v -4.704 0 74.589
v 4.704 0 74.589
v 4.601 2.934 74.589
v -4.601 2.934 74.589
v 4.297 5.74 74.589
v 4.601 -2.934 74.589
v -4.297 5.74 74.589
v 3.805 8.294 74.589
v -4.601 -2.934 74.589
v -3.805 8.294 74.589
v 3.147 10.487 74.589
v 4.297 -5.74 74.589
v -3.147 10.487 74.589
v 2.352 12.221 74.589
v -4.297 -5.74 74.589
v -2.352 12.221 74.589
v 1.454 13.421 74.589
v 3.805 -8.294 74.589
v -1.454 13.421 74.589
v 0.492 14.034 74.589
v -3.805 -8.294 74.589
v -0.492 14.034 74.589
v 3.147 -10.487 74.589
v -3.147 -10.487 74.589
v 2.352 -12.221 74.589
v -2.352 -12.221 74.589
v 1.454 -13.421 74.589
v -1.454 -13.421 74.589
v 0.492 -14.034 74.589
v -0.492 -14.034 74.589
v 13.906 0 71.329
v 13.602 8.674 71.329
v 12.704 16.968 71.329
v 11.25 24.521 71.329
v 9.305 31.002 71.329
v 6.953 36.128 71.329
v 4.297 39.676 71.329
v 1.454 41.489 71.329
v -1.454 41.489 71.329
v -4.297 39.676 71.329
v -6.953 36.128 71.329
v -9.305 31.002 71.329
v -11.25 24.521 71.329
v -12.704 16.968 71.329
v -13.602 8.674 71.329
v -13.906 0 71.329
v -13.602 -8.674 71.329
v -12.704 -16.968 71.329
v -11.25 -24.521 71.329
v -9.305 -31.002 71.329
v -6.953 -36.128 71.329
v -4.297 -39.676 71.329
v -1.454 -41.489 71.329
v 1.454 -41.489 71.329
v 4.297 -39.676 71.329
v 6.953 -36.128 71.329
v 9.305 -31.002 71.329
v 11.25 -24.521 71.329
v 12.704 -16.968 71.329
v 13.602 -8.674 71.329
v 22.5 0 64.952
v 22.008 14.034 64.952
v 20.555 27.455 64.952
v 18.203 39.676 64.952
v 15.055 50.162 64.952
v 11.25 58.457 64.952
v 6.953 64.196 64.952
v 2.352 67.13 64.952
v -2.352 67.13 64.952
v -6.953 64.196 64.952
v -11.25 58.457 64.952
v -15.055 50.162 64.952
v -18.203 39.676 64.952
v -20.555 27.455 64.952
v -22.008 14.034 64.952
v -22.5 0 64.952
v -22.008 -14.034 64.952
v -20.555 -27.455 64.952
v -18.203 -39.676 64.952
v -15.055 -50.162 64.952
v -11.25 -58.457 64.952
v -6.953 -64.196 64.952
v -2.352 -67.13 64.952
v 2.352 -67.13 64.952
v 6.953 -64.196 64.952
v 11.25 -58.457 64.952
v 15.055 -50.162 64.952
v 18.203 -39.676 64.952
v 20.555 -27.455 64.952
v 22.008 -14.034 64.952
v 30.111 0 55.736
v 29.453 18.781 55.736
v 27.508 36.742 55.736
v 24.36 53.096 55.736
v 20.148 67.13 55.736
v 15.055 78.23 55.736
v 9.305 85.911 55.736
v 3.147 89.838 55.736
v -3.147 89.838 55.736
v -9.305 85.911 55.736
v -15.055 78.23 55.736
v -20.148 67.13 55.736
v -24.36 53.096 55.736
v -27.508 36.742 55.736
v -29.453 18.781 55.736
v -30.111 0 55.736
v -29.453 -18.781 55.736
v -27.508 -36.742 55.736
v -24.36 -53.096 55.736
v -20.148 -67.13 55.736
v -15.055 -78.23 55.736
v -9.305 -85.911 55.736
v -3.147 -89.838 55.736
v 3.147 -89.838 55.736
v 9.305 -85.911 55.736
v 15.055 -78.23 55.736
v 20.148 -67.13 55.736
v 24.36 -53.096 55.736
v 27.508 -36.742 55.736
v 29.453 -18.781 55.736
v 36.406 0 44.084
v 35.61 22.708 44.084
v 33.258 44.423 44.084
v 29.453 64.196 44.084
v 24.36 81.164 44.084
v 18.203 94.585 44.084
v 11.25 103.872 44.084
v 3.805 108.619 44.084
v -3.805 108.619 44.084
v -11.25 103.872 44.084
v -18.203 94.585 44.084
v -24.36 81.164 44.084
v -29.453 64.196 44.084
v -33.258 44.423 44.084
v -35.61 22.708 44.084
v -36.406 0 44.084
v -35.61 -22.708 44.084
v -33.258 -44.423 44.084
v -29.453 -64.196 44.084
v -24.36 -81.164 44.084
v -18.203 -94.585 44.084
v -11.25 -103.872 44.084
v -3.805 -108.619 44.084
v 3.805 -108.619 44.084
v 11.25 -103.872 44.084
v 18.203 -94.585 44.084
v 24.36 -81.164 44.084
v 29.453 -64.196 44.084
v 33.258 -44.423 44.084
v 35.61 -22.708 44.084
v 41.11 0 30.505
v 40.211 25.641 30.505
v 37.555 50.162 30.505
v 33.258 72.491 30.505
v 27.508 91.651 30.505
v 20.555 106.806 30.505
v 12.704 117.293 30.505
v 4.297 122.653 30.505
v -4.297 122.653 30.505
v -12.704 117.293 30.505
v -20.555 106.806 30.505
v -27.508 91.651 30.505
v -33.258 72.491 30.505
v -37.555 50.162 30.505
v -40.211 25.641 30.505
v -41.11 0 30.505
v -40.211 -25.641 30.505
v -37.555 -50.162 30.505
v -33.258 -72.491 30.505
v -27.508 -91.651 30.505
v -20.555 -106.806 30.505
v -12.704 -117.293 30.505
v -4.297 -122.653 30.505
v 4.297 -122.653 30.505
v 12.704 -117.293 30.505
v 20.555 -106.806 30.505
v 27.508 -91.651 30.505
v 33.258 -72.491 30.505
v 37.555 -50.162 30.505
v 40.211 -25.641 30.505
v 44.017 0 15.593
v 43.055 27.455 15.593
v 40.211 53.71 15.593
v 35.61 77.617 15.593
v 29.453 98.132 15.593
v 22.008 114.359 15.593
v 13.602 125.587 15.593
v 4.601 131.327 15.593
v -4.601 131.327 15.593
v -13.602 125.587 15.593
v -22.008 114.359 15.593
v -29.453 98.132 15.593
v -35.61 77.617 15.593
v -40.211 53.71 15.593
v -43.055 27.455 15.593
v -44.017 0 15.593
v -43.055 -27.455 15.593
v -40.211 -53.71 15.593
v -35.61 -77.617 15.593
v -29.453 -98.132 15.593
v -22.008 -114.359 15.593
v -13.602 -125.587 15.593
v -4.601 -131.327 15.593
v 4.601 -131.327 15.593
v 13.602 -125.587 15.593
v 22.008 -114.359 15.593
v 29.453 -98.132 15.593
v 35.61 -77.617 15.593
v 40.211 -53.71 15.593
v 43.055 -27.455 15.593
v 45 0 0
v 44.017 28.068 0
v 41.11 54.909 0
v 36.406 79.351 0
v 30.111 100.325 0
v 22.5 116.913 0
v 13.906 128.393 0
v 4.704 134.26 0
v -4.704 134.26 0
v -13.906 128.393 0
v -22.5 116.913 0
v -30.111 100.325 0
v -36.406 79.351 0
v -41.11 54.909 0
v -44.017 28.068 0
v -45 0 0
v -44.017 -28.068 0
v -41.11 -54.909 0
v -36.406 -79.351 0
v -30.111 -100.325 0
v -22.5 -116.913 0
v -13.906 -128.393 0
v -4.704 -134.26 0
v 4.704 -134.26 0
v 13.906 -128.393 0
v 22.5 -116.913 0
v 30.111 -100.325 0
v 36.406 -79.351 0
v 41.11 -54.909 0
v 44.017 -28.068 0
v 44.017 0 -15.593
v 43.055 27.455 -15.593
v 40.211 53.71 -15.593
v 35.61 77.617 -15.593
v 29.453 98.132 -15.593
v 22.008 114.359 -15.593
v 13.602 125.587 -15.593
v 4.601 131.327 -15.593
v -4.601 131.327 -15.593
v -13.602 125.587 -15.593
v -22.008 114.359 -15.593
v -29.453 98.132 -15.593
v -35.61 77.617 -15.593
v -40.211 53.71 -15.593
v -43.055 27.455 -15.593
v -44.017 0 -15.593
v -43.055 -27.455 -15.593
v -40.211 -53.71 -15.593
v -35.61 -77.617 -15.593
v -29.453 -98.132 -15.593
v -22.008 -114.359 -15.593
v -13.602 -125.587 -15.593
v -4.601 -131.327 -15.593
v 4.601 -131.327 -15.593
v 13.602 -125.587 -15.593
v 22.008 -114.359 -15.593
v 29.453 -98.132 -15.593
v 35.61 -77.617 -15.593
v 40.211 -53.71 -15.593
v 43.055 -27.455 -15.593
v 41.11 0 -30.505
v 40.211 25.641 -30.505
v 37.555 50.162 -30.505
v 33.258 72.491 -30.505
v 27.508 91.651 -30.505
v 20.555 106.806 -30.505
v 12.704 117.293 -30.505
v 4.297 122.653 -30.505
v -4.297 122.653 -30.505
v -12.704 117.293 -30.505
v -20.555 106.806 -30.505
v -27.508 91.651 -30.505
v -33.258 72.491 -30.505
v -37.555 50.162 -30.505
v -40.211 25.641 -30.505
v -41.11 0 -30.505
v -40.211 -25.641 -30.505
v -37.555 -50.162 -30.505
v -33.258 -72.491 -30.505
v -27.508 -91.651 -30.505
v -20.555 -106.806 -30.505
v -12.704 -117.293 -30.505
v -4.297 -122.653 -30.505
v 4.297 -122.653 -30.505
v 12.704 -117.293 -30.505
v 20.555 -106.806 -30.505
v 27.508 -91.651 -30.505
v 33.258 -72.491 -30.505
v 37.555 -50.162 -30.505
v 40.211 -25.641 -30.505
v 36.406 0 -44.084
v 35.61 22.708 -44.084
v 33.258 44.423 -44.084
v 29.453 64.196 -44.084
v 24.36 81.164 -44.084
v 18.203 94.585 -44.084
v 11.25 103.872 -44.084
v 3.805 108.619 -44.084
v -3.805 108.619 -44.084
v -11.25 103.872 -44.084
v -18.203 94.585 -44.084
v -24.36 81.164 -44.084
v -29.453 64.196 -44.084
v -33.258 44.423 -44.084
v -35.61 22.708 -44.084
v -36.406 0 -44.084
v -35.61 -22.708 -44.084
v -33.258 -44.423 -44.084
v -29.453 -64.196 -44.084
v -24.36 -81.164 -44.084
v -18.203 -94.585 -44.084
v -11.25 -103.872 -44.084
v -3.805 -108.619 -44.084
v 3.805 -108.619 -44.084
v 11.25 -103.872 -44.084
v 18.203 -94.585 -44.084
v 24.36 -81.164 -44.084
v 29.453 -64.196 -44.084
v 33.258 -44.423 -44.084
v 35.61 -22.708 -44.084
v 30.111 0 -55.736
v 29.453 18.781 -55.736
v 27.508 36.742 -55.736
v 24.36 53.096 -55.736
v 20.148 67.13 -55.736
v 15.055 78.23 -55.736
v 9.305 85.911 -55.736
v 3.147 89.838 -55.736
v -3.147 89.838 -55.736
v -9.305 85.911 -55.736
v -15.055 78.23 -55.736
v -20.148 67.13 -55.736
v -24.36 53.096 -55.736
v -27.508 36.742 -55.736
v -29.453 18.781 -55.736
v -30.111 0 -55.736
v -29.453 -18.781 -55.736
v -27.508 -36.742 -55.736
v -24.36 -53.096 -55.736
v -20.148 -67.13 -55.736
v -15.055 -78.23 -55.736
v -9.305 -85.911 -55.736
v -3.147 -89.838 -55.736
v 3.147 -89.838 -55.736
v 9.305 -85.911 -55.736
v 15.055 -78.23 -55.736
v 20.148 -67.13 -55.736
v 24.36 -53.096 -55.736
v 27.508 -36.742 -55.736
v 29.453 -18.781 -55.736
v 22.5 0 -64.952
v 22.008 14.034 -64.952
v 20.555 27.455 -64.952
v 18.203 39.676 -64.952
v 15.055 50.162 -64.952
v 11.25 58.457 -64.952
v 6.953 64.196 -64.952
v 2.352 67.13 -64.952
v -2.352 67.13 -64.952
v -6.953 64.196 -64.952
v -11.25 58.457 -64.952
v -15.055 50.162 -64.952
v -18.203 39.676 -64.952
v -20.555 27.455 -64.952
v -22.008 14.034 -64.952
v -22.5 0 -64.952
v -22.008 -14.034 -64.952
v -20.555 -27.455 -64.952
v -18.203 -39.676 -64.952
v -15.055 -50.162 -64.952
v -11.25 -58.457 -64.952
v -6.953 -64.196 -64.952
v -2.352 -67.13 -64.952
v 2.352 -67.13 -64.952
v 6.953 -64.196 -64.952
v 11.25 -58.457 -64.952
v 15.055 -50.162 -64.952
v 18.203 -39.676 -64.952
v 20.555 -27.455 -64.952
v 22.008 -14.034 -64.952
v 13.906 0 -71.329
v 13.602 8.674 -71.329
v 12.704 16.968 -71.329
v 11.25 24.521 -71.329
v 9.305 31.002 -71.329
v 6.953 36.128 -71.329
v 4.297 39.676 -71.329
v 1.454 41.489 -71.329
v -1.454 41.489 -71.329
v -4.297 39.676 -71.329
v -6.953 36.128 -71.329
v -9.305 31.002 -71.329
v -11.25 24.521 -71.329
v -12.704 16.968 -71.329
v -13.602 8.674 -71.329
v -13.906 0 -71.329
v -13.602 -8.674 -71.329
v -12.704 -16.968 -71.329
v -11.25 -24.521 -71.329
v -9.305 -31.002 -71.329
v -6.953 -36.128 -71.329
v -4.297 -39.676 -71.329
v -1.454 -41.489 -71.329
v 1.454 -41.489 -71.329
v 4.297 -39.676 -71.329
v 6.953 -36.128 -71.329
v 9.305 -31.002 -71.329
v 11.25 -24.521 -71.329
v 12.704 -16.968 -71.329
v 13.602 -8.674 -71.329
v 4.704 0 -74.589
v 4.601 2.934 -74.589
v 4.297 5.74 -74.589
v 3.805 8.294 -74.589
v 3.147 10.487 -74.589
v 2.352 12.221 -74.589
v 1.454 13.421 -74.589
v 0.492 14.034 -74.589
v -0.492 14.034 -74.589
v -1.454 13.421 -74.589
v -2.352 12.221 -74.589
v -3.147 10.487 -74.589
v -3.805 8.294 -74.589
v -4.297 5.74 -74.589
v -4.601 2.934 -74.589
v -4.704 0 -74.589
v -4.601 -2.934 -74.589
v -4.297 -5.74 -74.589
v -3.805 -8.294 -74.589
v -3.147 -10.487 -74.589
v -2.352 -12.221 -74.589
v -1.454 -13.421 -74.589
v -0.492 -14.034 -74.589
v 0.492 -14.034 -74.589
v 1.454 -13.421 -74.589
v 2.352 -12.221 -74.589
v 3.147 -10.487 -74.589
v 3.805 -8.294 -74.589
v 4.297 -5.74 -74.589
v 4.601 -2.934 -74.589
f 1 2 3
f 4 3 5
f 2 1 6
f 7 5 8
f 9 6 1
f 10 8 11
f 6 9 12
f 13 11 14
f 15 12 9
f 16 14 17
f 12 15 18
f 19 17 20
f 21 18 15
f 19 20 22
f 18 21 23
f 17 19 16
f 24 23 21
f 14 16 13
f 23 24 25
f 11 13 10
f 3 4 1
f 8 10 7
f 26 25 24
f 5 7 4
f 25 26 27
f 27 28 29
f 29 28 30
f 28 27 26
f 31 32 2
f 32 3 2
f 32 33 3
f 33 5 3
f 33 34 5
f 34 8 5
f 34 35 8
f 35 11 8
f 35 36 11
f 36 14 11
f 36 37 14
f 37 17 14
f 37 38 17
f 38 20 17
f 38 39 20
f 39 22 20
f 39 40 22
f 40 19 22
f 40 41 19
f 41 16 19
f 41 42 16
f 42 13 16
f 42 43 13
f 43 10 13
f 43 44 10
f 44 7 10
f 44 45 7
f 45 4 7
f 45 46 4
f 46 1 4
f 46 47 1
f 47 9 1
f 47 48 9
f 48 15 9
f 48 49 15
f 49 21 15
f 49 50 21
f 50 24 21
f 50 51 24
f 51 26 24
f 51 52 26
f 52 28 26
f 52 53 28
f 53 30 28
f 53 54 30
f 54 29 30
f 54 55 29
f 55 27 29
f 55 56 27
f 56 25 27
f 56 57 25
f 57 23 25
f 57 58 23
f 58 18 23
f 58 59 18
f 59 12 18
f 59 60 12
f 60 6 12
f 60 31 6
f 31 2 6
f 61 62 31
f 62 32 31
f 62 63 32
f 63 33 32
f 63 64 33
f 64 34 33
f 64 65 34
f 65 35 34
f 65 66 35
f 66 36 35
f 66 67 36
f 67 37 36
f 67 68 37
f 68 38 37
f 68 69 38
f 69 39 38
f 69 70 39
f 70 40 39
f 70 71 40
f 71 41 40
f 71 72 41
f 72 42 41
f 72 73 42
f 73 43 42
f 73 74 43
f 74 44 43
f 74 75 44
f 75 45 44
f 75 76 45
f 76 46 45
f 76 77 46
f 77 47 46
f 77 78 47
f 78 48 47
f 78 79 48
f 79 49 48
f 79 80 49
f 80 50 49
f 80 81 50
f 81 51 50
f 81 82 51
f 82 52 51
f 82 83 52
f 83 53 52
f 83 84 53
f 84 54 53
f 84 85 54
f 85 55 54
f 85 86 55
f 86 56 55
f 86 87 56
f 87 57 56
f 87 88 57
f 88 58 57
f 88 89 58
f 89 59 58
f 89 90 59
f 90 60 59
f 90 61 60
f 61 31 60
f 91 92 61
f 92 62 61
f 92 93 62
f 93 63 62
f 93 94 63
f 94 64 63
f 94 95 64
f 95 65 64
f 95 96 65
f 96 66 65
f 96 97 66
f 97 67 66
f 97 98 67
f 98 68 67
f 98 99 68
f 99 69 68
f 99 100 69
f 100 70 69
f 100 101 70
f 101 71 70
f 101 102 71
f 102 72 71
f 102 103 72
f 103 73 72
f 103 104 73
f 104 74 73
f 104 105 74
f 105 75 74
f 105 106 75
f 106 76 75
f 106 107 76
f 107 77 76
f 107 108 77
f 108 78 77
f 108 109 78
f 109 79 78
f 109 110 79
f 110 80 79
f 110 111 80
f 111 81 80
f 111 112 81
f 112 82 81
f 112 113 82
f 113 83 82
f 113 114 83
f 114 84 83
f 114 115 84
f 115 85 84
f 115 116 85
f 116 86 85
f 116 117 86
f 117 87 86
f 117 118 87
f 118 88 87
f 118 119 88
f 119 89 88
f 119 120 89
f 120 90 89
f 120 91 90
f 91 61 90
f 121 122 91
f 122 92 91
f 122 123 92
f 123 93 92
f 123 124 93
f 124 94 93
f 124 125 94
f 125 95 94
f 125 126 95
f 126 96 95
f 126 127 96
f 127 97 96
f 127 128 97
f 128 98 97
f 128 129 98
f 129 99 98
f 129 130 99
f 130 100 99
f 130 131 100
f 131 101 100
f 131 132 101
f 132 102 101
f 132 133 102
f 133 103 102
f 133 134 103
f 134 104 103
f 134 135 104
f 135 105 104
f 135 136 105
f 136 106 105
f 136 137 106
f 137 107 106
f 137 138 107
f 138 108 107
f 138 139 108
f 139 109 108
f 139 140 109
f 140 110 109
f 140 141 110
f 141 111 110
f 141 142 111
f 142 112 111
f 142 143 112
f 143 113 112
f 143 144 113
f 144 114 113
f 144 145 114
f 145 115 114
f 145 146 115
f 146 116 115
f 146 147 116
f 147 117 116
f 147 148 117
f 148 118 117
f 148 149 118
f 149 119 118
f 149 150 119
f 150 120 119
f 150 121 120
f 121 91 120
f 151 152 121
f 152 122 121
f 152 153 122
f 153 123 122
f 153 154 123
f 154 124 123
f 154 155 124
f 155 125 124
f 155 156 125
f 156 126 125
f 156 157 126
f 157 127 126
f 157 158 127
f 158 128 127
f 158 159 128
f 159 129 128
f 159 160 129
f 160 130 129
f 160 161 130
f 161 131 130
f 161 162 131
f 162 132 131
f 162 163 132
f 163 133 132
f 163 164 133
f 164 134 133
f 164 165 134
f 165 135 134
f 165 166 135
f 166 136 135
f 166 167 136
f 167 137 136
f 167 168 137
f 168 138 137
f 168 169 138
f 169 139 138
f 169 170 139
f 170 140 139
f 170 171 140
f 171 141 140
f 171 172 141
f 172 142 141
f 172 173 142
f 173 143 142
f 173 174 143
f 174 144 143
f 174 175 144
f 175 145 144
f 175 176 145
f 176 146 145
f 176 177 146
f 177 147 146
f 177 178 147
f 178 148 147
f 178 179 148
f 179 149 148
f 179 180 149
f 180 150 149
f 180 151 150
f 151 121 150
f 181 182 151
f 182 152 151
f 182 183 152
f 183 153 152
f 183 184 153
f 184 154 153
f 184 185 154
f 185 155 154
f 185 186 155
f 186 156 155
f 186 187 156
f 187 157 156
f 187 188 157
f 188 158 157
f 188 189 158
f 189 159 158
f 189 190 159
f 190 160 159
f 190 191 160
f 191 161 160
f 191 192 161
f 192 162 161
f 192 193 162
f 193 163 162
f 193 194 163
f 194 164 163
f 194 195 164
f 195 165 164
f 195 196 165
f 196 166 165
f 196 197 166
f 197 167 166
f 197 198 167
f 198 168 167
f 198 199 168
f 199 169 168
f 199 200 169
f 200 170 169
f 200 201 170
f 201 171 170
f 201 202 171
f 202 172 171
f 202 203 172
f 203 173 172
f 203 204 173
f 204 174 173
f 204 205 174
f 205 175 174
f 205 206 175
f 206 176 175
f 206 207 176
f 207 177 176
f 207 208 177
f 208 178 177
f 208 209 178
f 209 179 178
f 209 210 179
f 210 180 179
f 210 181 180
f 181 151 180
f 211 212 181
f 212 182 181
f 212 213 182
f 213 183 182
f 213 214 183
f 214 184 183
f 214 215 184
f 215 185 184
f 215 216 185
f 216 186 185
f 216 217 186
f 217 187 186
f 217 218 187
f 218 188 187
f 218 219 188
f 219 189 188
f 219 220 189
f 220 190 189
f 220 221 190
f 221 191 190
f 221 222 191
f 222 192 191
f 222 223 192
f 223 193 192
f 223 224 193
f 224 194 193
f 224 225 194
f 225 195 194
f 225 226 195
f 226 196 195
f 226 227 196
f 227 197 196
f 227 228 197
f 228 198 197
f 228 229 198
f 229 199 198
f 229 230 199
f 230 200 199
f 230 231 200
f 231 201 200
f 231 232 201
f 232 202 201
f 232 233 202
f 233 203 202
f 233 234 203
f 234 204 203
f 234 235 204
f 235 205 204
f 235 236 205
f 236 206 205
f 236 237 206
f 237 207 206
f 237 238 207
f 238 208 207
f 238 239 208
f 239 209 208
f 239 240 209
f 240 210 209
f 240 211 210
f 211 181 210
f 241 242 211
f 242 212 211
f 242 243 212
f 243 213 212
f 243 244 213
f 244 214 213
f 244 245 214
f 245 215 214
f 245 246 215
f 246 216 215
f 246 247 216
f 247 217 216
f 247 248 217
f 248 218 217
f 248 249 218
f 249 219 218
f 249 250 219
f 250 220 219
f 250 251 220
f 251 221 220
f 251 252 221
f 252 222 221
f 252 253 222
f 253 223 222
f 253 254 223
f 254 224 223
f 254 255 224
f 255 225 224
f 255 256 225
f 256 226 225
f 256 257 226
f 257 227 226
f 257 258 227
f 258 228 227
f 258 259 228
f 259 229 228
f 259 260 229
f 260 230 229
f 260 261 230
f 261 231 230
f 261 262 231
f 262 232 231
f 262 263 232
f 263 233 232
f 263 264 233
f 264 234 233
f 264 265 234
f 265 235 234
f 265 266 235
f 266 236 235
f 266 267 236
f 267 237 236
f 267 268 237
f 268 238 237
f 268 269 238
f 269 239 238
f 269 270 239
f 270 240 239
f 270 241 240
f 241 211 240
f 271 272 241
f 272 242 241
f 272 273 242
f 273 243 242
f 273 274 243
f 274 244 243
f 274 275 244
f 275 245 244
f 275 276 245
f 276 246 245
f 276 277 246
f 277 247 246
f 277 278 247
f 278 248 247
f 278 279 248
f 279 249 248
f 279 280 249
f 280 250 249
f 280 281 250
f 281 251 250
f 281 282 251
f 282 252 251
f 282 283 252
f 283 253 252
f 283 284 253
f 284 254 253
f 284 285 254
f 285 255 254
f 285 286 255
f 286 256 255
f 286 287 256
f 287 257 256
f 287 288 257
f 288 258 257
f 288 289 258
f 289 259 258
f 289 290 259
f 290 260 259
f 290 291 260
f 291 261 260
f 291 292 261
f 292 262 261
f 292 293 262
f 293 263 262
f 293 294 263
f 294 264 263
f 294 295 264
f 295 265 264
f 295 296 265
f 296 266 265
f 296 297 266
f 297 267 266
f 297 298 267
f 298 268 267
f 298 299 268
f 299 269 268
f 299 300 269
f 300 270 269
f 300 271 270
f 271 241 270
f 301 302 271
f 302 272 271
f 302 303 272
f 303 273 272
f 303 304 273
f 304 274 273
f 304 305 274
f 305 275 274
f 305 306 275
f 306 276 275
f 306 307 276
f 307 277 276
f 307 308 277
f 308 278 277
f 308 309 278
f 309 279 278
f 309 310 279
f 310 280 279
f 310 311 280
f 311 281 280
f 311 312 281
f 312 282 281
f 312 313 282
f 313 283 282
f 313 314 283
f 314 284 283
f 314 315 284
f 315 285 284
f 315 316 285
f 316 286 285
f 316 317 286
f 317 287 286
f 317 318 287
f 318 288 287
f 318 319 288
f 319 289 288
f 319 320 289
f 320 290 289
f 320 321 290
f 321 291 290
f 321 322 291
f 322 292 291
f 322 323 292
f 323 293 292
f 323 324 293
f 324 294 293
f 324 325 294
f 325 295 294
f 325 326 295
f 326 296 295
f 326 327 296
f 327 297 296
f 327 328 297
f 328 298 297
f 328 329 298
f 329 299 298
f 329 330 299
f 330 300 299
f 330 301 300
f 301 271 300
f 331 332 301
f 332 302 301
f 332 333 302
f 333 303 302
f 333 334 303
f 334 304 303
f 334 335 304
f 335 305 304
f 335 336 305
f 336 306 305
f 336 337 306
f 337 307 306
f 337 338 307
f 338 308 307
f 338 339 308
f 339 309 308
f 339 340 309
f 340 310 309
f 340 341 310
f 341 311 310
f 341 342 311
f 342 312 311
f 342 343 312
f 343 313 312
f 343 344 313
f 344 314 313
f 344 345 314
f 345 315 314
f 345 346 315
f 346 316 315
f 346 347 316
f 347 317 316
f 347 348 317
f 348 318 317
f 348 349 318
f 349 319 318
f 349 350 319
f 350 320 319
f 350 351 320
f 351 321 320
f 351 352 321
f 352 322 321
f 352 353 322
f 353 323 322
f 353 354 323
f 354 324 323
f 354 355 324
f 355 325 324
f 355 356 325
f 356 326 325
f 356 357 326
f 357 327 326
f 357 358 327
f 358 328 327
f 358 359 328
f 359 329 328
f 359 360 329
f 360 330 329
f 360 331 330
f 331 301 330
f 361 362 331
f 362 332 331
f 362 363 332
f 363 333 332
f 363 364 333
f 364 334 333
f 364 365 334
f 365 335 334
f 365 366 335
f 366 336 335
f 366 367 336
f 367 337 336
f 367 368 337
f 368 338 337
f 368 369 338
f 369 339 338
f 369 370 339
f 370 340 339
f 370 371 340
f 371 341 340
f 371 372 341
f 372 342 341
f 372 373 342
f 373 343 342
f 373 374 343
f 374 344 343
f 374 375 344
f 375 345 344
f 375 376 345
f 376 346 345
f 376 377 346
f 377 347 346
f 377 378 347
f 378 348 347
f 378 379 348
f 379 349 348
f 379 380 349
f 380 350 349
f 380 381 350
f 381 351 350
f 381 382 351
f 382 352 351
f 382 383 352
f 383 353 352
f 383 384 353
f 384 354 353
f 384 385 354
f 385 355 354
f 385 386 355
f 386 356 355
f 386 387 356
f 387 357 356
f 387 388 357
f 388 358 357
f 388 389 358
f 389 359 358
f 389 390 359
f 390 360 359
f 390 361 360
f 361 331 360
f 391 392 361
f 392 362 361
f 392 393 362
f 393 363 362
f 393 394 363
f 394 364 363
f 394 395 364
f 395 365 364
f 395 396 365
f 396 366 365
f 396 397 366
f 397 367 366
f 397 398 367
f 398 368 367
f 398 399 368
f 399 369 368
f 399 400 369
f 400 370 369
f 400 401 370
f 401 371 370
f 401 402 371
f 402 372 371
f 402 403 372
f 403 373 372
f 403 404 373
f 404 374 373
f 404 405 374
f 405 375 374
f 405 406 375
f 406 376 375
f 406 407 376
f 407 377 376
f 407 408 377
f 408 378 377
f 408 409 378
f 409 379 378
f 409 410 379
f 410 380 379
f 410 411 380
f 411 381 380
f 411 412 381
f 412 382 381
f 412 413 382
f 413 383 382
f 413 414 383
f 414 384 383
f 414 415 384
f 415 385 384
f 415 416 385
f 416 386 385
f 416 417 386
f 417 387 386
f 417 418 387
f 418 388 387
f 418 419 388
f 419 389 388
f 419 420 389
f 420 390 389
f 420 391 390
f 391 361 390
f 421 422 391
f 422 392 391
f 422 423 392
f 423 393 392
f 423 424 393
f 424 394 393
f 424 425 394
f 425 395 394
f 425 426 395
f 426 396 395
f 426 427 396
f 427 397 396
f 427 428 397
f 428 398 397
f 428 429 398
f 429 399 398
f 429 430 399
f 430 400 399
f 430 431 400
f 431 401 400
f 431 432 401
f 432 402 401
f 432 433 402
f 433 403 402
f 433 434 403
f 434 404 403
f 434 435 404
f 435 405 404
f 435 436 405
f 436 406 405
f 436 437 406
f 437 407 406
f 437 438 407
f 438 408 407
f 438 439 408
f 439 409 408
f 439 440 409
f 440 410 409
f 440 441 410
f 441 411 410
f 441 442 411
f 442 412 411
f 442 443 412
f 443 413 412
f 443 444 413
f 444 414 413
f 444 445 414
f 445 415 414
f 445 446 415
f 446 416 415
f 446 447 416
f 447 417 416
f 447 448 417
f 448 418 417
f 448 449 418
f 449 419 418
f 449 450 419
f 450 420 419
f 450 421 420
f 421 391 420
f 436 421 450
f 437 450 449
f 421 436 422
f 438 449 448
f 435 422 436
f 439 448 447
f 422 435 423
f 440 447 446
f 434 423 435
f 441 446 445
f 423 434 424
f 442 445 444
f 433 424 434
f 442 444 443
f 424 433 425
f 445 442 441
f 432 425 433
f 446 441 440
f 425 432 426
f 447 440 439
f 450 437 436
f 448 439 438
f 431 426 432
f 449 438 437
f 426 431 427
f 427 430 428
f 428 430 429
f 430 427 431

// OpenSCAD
// Generated by SolidPython 1.0.1 on 2020-07-29 00:46:45


scale(v = [3, 9, 5]) {
	sphere(r = 15);
}
/***********************************************
*********      SolidPython code:      **********
************************************************
 
# import packages: SolidPython
from solid import *
from solid.utils import *
from itertools import chain, combinations, permutations


class Resize:

    def __init__(self, scad_file):
        self.scad_file = scad_file
        #self.scad_file = import_scad(scad_file)
        # cone/cylinder param:
        self.r1 = 0
        self.r2 = 0
        self.h = 0
        # rectangular prism param:
        self.w = 0
        self.l = 0
        # ellipse param:
        self.r = 0

    # import OpenScad code (file name corresponds to shape)


    # classify shape + parameters
    def assign(self, param1, param2, param3):
        if self.scad_file == 'cone.scad':
            self.r1 = param1
            self.r2 = param2
            self.h = param3
        elif self.scad_file == 'cylinder.scad':
            self.r1 = param1
            self.r2 = param2
            self.h = param3
        elif self.scad_file == 'rectangularPrism.scad':
            self.h = param1
            self.l = param2
            self.w = param3
        else:
            self.r = param1
            self.h = param2

    # resize parameters
    def iterate(self):
        x = range(3, 20, 2)
        i = 1
        if self.scad_file == 'cone.scad':
            tempList = list(permutations(x, 2))
            for temp in tempList:
                param1 = temp[0]
                param2 = temp[1]
                filepath = 'produced_scad_files/' + 'cone' + str(param1) + '_' + str(param2) + '_' + '.scad'
                scad_render_to_file(cylinder(h=param1, r1=param2, r2=0), filepath)

        elif self.scad_file == 'cylinder.scad':
            tempList = list(permutations(x, 3))
            for temp in tempList:
                param1 = temp[0]
                param2 = temp[1]
                filepath = 'produced_scad_files/' + 'cylinder' + str(param1) + '_' + str(param2) + '_' + '.scad'
                scad_render_to_file(cylinder(h=param1, r1=param2, r2=param2), filepath)

        elif self.scad_file == 'rectangularPrism.scad':
            tempList = list(permutations(x, 3))
            for temp in tempList:
                param1 = temp[0]
                param2 = temp[1]
                param3 = temp[2]
                filepath = 'produced_scad_files/' + 'rectangularPrism' + str(param1) + '_' + str(param2) + '_' + str(
                    param3) + '.scad'
                scad_render_to_file(cube(size=(param1, param2, param3)), filepath)

        elif self.scad_file == 'ellipse.scad':
            tempList = list(permutations(x, 4))
            for temp in tempList:
                param1 = temp[0]
                param2 = temp[1]
                param3 = temp[2]
                param4 = temp[3]
                filepath = 'produced_scad_files/' + 'ellipse' + str(param1) + '_' + str(param2) + '_' + str(param3) + '_' + str(param4) + '.scad'
                scad_render_to_file(scale([param1, param2, param3])(sphere(r=param4)), filepath)

    def render_to_scadfile(self):
        scad_render_to_file(scad, 'example.scad') 
 
************************************************/
